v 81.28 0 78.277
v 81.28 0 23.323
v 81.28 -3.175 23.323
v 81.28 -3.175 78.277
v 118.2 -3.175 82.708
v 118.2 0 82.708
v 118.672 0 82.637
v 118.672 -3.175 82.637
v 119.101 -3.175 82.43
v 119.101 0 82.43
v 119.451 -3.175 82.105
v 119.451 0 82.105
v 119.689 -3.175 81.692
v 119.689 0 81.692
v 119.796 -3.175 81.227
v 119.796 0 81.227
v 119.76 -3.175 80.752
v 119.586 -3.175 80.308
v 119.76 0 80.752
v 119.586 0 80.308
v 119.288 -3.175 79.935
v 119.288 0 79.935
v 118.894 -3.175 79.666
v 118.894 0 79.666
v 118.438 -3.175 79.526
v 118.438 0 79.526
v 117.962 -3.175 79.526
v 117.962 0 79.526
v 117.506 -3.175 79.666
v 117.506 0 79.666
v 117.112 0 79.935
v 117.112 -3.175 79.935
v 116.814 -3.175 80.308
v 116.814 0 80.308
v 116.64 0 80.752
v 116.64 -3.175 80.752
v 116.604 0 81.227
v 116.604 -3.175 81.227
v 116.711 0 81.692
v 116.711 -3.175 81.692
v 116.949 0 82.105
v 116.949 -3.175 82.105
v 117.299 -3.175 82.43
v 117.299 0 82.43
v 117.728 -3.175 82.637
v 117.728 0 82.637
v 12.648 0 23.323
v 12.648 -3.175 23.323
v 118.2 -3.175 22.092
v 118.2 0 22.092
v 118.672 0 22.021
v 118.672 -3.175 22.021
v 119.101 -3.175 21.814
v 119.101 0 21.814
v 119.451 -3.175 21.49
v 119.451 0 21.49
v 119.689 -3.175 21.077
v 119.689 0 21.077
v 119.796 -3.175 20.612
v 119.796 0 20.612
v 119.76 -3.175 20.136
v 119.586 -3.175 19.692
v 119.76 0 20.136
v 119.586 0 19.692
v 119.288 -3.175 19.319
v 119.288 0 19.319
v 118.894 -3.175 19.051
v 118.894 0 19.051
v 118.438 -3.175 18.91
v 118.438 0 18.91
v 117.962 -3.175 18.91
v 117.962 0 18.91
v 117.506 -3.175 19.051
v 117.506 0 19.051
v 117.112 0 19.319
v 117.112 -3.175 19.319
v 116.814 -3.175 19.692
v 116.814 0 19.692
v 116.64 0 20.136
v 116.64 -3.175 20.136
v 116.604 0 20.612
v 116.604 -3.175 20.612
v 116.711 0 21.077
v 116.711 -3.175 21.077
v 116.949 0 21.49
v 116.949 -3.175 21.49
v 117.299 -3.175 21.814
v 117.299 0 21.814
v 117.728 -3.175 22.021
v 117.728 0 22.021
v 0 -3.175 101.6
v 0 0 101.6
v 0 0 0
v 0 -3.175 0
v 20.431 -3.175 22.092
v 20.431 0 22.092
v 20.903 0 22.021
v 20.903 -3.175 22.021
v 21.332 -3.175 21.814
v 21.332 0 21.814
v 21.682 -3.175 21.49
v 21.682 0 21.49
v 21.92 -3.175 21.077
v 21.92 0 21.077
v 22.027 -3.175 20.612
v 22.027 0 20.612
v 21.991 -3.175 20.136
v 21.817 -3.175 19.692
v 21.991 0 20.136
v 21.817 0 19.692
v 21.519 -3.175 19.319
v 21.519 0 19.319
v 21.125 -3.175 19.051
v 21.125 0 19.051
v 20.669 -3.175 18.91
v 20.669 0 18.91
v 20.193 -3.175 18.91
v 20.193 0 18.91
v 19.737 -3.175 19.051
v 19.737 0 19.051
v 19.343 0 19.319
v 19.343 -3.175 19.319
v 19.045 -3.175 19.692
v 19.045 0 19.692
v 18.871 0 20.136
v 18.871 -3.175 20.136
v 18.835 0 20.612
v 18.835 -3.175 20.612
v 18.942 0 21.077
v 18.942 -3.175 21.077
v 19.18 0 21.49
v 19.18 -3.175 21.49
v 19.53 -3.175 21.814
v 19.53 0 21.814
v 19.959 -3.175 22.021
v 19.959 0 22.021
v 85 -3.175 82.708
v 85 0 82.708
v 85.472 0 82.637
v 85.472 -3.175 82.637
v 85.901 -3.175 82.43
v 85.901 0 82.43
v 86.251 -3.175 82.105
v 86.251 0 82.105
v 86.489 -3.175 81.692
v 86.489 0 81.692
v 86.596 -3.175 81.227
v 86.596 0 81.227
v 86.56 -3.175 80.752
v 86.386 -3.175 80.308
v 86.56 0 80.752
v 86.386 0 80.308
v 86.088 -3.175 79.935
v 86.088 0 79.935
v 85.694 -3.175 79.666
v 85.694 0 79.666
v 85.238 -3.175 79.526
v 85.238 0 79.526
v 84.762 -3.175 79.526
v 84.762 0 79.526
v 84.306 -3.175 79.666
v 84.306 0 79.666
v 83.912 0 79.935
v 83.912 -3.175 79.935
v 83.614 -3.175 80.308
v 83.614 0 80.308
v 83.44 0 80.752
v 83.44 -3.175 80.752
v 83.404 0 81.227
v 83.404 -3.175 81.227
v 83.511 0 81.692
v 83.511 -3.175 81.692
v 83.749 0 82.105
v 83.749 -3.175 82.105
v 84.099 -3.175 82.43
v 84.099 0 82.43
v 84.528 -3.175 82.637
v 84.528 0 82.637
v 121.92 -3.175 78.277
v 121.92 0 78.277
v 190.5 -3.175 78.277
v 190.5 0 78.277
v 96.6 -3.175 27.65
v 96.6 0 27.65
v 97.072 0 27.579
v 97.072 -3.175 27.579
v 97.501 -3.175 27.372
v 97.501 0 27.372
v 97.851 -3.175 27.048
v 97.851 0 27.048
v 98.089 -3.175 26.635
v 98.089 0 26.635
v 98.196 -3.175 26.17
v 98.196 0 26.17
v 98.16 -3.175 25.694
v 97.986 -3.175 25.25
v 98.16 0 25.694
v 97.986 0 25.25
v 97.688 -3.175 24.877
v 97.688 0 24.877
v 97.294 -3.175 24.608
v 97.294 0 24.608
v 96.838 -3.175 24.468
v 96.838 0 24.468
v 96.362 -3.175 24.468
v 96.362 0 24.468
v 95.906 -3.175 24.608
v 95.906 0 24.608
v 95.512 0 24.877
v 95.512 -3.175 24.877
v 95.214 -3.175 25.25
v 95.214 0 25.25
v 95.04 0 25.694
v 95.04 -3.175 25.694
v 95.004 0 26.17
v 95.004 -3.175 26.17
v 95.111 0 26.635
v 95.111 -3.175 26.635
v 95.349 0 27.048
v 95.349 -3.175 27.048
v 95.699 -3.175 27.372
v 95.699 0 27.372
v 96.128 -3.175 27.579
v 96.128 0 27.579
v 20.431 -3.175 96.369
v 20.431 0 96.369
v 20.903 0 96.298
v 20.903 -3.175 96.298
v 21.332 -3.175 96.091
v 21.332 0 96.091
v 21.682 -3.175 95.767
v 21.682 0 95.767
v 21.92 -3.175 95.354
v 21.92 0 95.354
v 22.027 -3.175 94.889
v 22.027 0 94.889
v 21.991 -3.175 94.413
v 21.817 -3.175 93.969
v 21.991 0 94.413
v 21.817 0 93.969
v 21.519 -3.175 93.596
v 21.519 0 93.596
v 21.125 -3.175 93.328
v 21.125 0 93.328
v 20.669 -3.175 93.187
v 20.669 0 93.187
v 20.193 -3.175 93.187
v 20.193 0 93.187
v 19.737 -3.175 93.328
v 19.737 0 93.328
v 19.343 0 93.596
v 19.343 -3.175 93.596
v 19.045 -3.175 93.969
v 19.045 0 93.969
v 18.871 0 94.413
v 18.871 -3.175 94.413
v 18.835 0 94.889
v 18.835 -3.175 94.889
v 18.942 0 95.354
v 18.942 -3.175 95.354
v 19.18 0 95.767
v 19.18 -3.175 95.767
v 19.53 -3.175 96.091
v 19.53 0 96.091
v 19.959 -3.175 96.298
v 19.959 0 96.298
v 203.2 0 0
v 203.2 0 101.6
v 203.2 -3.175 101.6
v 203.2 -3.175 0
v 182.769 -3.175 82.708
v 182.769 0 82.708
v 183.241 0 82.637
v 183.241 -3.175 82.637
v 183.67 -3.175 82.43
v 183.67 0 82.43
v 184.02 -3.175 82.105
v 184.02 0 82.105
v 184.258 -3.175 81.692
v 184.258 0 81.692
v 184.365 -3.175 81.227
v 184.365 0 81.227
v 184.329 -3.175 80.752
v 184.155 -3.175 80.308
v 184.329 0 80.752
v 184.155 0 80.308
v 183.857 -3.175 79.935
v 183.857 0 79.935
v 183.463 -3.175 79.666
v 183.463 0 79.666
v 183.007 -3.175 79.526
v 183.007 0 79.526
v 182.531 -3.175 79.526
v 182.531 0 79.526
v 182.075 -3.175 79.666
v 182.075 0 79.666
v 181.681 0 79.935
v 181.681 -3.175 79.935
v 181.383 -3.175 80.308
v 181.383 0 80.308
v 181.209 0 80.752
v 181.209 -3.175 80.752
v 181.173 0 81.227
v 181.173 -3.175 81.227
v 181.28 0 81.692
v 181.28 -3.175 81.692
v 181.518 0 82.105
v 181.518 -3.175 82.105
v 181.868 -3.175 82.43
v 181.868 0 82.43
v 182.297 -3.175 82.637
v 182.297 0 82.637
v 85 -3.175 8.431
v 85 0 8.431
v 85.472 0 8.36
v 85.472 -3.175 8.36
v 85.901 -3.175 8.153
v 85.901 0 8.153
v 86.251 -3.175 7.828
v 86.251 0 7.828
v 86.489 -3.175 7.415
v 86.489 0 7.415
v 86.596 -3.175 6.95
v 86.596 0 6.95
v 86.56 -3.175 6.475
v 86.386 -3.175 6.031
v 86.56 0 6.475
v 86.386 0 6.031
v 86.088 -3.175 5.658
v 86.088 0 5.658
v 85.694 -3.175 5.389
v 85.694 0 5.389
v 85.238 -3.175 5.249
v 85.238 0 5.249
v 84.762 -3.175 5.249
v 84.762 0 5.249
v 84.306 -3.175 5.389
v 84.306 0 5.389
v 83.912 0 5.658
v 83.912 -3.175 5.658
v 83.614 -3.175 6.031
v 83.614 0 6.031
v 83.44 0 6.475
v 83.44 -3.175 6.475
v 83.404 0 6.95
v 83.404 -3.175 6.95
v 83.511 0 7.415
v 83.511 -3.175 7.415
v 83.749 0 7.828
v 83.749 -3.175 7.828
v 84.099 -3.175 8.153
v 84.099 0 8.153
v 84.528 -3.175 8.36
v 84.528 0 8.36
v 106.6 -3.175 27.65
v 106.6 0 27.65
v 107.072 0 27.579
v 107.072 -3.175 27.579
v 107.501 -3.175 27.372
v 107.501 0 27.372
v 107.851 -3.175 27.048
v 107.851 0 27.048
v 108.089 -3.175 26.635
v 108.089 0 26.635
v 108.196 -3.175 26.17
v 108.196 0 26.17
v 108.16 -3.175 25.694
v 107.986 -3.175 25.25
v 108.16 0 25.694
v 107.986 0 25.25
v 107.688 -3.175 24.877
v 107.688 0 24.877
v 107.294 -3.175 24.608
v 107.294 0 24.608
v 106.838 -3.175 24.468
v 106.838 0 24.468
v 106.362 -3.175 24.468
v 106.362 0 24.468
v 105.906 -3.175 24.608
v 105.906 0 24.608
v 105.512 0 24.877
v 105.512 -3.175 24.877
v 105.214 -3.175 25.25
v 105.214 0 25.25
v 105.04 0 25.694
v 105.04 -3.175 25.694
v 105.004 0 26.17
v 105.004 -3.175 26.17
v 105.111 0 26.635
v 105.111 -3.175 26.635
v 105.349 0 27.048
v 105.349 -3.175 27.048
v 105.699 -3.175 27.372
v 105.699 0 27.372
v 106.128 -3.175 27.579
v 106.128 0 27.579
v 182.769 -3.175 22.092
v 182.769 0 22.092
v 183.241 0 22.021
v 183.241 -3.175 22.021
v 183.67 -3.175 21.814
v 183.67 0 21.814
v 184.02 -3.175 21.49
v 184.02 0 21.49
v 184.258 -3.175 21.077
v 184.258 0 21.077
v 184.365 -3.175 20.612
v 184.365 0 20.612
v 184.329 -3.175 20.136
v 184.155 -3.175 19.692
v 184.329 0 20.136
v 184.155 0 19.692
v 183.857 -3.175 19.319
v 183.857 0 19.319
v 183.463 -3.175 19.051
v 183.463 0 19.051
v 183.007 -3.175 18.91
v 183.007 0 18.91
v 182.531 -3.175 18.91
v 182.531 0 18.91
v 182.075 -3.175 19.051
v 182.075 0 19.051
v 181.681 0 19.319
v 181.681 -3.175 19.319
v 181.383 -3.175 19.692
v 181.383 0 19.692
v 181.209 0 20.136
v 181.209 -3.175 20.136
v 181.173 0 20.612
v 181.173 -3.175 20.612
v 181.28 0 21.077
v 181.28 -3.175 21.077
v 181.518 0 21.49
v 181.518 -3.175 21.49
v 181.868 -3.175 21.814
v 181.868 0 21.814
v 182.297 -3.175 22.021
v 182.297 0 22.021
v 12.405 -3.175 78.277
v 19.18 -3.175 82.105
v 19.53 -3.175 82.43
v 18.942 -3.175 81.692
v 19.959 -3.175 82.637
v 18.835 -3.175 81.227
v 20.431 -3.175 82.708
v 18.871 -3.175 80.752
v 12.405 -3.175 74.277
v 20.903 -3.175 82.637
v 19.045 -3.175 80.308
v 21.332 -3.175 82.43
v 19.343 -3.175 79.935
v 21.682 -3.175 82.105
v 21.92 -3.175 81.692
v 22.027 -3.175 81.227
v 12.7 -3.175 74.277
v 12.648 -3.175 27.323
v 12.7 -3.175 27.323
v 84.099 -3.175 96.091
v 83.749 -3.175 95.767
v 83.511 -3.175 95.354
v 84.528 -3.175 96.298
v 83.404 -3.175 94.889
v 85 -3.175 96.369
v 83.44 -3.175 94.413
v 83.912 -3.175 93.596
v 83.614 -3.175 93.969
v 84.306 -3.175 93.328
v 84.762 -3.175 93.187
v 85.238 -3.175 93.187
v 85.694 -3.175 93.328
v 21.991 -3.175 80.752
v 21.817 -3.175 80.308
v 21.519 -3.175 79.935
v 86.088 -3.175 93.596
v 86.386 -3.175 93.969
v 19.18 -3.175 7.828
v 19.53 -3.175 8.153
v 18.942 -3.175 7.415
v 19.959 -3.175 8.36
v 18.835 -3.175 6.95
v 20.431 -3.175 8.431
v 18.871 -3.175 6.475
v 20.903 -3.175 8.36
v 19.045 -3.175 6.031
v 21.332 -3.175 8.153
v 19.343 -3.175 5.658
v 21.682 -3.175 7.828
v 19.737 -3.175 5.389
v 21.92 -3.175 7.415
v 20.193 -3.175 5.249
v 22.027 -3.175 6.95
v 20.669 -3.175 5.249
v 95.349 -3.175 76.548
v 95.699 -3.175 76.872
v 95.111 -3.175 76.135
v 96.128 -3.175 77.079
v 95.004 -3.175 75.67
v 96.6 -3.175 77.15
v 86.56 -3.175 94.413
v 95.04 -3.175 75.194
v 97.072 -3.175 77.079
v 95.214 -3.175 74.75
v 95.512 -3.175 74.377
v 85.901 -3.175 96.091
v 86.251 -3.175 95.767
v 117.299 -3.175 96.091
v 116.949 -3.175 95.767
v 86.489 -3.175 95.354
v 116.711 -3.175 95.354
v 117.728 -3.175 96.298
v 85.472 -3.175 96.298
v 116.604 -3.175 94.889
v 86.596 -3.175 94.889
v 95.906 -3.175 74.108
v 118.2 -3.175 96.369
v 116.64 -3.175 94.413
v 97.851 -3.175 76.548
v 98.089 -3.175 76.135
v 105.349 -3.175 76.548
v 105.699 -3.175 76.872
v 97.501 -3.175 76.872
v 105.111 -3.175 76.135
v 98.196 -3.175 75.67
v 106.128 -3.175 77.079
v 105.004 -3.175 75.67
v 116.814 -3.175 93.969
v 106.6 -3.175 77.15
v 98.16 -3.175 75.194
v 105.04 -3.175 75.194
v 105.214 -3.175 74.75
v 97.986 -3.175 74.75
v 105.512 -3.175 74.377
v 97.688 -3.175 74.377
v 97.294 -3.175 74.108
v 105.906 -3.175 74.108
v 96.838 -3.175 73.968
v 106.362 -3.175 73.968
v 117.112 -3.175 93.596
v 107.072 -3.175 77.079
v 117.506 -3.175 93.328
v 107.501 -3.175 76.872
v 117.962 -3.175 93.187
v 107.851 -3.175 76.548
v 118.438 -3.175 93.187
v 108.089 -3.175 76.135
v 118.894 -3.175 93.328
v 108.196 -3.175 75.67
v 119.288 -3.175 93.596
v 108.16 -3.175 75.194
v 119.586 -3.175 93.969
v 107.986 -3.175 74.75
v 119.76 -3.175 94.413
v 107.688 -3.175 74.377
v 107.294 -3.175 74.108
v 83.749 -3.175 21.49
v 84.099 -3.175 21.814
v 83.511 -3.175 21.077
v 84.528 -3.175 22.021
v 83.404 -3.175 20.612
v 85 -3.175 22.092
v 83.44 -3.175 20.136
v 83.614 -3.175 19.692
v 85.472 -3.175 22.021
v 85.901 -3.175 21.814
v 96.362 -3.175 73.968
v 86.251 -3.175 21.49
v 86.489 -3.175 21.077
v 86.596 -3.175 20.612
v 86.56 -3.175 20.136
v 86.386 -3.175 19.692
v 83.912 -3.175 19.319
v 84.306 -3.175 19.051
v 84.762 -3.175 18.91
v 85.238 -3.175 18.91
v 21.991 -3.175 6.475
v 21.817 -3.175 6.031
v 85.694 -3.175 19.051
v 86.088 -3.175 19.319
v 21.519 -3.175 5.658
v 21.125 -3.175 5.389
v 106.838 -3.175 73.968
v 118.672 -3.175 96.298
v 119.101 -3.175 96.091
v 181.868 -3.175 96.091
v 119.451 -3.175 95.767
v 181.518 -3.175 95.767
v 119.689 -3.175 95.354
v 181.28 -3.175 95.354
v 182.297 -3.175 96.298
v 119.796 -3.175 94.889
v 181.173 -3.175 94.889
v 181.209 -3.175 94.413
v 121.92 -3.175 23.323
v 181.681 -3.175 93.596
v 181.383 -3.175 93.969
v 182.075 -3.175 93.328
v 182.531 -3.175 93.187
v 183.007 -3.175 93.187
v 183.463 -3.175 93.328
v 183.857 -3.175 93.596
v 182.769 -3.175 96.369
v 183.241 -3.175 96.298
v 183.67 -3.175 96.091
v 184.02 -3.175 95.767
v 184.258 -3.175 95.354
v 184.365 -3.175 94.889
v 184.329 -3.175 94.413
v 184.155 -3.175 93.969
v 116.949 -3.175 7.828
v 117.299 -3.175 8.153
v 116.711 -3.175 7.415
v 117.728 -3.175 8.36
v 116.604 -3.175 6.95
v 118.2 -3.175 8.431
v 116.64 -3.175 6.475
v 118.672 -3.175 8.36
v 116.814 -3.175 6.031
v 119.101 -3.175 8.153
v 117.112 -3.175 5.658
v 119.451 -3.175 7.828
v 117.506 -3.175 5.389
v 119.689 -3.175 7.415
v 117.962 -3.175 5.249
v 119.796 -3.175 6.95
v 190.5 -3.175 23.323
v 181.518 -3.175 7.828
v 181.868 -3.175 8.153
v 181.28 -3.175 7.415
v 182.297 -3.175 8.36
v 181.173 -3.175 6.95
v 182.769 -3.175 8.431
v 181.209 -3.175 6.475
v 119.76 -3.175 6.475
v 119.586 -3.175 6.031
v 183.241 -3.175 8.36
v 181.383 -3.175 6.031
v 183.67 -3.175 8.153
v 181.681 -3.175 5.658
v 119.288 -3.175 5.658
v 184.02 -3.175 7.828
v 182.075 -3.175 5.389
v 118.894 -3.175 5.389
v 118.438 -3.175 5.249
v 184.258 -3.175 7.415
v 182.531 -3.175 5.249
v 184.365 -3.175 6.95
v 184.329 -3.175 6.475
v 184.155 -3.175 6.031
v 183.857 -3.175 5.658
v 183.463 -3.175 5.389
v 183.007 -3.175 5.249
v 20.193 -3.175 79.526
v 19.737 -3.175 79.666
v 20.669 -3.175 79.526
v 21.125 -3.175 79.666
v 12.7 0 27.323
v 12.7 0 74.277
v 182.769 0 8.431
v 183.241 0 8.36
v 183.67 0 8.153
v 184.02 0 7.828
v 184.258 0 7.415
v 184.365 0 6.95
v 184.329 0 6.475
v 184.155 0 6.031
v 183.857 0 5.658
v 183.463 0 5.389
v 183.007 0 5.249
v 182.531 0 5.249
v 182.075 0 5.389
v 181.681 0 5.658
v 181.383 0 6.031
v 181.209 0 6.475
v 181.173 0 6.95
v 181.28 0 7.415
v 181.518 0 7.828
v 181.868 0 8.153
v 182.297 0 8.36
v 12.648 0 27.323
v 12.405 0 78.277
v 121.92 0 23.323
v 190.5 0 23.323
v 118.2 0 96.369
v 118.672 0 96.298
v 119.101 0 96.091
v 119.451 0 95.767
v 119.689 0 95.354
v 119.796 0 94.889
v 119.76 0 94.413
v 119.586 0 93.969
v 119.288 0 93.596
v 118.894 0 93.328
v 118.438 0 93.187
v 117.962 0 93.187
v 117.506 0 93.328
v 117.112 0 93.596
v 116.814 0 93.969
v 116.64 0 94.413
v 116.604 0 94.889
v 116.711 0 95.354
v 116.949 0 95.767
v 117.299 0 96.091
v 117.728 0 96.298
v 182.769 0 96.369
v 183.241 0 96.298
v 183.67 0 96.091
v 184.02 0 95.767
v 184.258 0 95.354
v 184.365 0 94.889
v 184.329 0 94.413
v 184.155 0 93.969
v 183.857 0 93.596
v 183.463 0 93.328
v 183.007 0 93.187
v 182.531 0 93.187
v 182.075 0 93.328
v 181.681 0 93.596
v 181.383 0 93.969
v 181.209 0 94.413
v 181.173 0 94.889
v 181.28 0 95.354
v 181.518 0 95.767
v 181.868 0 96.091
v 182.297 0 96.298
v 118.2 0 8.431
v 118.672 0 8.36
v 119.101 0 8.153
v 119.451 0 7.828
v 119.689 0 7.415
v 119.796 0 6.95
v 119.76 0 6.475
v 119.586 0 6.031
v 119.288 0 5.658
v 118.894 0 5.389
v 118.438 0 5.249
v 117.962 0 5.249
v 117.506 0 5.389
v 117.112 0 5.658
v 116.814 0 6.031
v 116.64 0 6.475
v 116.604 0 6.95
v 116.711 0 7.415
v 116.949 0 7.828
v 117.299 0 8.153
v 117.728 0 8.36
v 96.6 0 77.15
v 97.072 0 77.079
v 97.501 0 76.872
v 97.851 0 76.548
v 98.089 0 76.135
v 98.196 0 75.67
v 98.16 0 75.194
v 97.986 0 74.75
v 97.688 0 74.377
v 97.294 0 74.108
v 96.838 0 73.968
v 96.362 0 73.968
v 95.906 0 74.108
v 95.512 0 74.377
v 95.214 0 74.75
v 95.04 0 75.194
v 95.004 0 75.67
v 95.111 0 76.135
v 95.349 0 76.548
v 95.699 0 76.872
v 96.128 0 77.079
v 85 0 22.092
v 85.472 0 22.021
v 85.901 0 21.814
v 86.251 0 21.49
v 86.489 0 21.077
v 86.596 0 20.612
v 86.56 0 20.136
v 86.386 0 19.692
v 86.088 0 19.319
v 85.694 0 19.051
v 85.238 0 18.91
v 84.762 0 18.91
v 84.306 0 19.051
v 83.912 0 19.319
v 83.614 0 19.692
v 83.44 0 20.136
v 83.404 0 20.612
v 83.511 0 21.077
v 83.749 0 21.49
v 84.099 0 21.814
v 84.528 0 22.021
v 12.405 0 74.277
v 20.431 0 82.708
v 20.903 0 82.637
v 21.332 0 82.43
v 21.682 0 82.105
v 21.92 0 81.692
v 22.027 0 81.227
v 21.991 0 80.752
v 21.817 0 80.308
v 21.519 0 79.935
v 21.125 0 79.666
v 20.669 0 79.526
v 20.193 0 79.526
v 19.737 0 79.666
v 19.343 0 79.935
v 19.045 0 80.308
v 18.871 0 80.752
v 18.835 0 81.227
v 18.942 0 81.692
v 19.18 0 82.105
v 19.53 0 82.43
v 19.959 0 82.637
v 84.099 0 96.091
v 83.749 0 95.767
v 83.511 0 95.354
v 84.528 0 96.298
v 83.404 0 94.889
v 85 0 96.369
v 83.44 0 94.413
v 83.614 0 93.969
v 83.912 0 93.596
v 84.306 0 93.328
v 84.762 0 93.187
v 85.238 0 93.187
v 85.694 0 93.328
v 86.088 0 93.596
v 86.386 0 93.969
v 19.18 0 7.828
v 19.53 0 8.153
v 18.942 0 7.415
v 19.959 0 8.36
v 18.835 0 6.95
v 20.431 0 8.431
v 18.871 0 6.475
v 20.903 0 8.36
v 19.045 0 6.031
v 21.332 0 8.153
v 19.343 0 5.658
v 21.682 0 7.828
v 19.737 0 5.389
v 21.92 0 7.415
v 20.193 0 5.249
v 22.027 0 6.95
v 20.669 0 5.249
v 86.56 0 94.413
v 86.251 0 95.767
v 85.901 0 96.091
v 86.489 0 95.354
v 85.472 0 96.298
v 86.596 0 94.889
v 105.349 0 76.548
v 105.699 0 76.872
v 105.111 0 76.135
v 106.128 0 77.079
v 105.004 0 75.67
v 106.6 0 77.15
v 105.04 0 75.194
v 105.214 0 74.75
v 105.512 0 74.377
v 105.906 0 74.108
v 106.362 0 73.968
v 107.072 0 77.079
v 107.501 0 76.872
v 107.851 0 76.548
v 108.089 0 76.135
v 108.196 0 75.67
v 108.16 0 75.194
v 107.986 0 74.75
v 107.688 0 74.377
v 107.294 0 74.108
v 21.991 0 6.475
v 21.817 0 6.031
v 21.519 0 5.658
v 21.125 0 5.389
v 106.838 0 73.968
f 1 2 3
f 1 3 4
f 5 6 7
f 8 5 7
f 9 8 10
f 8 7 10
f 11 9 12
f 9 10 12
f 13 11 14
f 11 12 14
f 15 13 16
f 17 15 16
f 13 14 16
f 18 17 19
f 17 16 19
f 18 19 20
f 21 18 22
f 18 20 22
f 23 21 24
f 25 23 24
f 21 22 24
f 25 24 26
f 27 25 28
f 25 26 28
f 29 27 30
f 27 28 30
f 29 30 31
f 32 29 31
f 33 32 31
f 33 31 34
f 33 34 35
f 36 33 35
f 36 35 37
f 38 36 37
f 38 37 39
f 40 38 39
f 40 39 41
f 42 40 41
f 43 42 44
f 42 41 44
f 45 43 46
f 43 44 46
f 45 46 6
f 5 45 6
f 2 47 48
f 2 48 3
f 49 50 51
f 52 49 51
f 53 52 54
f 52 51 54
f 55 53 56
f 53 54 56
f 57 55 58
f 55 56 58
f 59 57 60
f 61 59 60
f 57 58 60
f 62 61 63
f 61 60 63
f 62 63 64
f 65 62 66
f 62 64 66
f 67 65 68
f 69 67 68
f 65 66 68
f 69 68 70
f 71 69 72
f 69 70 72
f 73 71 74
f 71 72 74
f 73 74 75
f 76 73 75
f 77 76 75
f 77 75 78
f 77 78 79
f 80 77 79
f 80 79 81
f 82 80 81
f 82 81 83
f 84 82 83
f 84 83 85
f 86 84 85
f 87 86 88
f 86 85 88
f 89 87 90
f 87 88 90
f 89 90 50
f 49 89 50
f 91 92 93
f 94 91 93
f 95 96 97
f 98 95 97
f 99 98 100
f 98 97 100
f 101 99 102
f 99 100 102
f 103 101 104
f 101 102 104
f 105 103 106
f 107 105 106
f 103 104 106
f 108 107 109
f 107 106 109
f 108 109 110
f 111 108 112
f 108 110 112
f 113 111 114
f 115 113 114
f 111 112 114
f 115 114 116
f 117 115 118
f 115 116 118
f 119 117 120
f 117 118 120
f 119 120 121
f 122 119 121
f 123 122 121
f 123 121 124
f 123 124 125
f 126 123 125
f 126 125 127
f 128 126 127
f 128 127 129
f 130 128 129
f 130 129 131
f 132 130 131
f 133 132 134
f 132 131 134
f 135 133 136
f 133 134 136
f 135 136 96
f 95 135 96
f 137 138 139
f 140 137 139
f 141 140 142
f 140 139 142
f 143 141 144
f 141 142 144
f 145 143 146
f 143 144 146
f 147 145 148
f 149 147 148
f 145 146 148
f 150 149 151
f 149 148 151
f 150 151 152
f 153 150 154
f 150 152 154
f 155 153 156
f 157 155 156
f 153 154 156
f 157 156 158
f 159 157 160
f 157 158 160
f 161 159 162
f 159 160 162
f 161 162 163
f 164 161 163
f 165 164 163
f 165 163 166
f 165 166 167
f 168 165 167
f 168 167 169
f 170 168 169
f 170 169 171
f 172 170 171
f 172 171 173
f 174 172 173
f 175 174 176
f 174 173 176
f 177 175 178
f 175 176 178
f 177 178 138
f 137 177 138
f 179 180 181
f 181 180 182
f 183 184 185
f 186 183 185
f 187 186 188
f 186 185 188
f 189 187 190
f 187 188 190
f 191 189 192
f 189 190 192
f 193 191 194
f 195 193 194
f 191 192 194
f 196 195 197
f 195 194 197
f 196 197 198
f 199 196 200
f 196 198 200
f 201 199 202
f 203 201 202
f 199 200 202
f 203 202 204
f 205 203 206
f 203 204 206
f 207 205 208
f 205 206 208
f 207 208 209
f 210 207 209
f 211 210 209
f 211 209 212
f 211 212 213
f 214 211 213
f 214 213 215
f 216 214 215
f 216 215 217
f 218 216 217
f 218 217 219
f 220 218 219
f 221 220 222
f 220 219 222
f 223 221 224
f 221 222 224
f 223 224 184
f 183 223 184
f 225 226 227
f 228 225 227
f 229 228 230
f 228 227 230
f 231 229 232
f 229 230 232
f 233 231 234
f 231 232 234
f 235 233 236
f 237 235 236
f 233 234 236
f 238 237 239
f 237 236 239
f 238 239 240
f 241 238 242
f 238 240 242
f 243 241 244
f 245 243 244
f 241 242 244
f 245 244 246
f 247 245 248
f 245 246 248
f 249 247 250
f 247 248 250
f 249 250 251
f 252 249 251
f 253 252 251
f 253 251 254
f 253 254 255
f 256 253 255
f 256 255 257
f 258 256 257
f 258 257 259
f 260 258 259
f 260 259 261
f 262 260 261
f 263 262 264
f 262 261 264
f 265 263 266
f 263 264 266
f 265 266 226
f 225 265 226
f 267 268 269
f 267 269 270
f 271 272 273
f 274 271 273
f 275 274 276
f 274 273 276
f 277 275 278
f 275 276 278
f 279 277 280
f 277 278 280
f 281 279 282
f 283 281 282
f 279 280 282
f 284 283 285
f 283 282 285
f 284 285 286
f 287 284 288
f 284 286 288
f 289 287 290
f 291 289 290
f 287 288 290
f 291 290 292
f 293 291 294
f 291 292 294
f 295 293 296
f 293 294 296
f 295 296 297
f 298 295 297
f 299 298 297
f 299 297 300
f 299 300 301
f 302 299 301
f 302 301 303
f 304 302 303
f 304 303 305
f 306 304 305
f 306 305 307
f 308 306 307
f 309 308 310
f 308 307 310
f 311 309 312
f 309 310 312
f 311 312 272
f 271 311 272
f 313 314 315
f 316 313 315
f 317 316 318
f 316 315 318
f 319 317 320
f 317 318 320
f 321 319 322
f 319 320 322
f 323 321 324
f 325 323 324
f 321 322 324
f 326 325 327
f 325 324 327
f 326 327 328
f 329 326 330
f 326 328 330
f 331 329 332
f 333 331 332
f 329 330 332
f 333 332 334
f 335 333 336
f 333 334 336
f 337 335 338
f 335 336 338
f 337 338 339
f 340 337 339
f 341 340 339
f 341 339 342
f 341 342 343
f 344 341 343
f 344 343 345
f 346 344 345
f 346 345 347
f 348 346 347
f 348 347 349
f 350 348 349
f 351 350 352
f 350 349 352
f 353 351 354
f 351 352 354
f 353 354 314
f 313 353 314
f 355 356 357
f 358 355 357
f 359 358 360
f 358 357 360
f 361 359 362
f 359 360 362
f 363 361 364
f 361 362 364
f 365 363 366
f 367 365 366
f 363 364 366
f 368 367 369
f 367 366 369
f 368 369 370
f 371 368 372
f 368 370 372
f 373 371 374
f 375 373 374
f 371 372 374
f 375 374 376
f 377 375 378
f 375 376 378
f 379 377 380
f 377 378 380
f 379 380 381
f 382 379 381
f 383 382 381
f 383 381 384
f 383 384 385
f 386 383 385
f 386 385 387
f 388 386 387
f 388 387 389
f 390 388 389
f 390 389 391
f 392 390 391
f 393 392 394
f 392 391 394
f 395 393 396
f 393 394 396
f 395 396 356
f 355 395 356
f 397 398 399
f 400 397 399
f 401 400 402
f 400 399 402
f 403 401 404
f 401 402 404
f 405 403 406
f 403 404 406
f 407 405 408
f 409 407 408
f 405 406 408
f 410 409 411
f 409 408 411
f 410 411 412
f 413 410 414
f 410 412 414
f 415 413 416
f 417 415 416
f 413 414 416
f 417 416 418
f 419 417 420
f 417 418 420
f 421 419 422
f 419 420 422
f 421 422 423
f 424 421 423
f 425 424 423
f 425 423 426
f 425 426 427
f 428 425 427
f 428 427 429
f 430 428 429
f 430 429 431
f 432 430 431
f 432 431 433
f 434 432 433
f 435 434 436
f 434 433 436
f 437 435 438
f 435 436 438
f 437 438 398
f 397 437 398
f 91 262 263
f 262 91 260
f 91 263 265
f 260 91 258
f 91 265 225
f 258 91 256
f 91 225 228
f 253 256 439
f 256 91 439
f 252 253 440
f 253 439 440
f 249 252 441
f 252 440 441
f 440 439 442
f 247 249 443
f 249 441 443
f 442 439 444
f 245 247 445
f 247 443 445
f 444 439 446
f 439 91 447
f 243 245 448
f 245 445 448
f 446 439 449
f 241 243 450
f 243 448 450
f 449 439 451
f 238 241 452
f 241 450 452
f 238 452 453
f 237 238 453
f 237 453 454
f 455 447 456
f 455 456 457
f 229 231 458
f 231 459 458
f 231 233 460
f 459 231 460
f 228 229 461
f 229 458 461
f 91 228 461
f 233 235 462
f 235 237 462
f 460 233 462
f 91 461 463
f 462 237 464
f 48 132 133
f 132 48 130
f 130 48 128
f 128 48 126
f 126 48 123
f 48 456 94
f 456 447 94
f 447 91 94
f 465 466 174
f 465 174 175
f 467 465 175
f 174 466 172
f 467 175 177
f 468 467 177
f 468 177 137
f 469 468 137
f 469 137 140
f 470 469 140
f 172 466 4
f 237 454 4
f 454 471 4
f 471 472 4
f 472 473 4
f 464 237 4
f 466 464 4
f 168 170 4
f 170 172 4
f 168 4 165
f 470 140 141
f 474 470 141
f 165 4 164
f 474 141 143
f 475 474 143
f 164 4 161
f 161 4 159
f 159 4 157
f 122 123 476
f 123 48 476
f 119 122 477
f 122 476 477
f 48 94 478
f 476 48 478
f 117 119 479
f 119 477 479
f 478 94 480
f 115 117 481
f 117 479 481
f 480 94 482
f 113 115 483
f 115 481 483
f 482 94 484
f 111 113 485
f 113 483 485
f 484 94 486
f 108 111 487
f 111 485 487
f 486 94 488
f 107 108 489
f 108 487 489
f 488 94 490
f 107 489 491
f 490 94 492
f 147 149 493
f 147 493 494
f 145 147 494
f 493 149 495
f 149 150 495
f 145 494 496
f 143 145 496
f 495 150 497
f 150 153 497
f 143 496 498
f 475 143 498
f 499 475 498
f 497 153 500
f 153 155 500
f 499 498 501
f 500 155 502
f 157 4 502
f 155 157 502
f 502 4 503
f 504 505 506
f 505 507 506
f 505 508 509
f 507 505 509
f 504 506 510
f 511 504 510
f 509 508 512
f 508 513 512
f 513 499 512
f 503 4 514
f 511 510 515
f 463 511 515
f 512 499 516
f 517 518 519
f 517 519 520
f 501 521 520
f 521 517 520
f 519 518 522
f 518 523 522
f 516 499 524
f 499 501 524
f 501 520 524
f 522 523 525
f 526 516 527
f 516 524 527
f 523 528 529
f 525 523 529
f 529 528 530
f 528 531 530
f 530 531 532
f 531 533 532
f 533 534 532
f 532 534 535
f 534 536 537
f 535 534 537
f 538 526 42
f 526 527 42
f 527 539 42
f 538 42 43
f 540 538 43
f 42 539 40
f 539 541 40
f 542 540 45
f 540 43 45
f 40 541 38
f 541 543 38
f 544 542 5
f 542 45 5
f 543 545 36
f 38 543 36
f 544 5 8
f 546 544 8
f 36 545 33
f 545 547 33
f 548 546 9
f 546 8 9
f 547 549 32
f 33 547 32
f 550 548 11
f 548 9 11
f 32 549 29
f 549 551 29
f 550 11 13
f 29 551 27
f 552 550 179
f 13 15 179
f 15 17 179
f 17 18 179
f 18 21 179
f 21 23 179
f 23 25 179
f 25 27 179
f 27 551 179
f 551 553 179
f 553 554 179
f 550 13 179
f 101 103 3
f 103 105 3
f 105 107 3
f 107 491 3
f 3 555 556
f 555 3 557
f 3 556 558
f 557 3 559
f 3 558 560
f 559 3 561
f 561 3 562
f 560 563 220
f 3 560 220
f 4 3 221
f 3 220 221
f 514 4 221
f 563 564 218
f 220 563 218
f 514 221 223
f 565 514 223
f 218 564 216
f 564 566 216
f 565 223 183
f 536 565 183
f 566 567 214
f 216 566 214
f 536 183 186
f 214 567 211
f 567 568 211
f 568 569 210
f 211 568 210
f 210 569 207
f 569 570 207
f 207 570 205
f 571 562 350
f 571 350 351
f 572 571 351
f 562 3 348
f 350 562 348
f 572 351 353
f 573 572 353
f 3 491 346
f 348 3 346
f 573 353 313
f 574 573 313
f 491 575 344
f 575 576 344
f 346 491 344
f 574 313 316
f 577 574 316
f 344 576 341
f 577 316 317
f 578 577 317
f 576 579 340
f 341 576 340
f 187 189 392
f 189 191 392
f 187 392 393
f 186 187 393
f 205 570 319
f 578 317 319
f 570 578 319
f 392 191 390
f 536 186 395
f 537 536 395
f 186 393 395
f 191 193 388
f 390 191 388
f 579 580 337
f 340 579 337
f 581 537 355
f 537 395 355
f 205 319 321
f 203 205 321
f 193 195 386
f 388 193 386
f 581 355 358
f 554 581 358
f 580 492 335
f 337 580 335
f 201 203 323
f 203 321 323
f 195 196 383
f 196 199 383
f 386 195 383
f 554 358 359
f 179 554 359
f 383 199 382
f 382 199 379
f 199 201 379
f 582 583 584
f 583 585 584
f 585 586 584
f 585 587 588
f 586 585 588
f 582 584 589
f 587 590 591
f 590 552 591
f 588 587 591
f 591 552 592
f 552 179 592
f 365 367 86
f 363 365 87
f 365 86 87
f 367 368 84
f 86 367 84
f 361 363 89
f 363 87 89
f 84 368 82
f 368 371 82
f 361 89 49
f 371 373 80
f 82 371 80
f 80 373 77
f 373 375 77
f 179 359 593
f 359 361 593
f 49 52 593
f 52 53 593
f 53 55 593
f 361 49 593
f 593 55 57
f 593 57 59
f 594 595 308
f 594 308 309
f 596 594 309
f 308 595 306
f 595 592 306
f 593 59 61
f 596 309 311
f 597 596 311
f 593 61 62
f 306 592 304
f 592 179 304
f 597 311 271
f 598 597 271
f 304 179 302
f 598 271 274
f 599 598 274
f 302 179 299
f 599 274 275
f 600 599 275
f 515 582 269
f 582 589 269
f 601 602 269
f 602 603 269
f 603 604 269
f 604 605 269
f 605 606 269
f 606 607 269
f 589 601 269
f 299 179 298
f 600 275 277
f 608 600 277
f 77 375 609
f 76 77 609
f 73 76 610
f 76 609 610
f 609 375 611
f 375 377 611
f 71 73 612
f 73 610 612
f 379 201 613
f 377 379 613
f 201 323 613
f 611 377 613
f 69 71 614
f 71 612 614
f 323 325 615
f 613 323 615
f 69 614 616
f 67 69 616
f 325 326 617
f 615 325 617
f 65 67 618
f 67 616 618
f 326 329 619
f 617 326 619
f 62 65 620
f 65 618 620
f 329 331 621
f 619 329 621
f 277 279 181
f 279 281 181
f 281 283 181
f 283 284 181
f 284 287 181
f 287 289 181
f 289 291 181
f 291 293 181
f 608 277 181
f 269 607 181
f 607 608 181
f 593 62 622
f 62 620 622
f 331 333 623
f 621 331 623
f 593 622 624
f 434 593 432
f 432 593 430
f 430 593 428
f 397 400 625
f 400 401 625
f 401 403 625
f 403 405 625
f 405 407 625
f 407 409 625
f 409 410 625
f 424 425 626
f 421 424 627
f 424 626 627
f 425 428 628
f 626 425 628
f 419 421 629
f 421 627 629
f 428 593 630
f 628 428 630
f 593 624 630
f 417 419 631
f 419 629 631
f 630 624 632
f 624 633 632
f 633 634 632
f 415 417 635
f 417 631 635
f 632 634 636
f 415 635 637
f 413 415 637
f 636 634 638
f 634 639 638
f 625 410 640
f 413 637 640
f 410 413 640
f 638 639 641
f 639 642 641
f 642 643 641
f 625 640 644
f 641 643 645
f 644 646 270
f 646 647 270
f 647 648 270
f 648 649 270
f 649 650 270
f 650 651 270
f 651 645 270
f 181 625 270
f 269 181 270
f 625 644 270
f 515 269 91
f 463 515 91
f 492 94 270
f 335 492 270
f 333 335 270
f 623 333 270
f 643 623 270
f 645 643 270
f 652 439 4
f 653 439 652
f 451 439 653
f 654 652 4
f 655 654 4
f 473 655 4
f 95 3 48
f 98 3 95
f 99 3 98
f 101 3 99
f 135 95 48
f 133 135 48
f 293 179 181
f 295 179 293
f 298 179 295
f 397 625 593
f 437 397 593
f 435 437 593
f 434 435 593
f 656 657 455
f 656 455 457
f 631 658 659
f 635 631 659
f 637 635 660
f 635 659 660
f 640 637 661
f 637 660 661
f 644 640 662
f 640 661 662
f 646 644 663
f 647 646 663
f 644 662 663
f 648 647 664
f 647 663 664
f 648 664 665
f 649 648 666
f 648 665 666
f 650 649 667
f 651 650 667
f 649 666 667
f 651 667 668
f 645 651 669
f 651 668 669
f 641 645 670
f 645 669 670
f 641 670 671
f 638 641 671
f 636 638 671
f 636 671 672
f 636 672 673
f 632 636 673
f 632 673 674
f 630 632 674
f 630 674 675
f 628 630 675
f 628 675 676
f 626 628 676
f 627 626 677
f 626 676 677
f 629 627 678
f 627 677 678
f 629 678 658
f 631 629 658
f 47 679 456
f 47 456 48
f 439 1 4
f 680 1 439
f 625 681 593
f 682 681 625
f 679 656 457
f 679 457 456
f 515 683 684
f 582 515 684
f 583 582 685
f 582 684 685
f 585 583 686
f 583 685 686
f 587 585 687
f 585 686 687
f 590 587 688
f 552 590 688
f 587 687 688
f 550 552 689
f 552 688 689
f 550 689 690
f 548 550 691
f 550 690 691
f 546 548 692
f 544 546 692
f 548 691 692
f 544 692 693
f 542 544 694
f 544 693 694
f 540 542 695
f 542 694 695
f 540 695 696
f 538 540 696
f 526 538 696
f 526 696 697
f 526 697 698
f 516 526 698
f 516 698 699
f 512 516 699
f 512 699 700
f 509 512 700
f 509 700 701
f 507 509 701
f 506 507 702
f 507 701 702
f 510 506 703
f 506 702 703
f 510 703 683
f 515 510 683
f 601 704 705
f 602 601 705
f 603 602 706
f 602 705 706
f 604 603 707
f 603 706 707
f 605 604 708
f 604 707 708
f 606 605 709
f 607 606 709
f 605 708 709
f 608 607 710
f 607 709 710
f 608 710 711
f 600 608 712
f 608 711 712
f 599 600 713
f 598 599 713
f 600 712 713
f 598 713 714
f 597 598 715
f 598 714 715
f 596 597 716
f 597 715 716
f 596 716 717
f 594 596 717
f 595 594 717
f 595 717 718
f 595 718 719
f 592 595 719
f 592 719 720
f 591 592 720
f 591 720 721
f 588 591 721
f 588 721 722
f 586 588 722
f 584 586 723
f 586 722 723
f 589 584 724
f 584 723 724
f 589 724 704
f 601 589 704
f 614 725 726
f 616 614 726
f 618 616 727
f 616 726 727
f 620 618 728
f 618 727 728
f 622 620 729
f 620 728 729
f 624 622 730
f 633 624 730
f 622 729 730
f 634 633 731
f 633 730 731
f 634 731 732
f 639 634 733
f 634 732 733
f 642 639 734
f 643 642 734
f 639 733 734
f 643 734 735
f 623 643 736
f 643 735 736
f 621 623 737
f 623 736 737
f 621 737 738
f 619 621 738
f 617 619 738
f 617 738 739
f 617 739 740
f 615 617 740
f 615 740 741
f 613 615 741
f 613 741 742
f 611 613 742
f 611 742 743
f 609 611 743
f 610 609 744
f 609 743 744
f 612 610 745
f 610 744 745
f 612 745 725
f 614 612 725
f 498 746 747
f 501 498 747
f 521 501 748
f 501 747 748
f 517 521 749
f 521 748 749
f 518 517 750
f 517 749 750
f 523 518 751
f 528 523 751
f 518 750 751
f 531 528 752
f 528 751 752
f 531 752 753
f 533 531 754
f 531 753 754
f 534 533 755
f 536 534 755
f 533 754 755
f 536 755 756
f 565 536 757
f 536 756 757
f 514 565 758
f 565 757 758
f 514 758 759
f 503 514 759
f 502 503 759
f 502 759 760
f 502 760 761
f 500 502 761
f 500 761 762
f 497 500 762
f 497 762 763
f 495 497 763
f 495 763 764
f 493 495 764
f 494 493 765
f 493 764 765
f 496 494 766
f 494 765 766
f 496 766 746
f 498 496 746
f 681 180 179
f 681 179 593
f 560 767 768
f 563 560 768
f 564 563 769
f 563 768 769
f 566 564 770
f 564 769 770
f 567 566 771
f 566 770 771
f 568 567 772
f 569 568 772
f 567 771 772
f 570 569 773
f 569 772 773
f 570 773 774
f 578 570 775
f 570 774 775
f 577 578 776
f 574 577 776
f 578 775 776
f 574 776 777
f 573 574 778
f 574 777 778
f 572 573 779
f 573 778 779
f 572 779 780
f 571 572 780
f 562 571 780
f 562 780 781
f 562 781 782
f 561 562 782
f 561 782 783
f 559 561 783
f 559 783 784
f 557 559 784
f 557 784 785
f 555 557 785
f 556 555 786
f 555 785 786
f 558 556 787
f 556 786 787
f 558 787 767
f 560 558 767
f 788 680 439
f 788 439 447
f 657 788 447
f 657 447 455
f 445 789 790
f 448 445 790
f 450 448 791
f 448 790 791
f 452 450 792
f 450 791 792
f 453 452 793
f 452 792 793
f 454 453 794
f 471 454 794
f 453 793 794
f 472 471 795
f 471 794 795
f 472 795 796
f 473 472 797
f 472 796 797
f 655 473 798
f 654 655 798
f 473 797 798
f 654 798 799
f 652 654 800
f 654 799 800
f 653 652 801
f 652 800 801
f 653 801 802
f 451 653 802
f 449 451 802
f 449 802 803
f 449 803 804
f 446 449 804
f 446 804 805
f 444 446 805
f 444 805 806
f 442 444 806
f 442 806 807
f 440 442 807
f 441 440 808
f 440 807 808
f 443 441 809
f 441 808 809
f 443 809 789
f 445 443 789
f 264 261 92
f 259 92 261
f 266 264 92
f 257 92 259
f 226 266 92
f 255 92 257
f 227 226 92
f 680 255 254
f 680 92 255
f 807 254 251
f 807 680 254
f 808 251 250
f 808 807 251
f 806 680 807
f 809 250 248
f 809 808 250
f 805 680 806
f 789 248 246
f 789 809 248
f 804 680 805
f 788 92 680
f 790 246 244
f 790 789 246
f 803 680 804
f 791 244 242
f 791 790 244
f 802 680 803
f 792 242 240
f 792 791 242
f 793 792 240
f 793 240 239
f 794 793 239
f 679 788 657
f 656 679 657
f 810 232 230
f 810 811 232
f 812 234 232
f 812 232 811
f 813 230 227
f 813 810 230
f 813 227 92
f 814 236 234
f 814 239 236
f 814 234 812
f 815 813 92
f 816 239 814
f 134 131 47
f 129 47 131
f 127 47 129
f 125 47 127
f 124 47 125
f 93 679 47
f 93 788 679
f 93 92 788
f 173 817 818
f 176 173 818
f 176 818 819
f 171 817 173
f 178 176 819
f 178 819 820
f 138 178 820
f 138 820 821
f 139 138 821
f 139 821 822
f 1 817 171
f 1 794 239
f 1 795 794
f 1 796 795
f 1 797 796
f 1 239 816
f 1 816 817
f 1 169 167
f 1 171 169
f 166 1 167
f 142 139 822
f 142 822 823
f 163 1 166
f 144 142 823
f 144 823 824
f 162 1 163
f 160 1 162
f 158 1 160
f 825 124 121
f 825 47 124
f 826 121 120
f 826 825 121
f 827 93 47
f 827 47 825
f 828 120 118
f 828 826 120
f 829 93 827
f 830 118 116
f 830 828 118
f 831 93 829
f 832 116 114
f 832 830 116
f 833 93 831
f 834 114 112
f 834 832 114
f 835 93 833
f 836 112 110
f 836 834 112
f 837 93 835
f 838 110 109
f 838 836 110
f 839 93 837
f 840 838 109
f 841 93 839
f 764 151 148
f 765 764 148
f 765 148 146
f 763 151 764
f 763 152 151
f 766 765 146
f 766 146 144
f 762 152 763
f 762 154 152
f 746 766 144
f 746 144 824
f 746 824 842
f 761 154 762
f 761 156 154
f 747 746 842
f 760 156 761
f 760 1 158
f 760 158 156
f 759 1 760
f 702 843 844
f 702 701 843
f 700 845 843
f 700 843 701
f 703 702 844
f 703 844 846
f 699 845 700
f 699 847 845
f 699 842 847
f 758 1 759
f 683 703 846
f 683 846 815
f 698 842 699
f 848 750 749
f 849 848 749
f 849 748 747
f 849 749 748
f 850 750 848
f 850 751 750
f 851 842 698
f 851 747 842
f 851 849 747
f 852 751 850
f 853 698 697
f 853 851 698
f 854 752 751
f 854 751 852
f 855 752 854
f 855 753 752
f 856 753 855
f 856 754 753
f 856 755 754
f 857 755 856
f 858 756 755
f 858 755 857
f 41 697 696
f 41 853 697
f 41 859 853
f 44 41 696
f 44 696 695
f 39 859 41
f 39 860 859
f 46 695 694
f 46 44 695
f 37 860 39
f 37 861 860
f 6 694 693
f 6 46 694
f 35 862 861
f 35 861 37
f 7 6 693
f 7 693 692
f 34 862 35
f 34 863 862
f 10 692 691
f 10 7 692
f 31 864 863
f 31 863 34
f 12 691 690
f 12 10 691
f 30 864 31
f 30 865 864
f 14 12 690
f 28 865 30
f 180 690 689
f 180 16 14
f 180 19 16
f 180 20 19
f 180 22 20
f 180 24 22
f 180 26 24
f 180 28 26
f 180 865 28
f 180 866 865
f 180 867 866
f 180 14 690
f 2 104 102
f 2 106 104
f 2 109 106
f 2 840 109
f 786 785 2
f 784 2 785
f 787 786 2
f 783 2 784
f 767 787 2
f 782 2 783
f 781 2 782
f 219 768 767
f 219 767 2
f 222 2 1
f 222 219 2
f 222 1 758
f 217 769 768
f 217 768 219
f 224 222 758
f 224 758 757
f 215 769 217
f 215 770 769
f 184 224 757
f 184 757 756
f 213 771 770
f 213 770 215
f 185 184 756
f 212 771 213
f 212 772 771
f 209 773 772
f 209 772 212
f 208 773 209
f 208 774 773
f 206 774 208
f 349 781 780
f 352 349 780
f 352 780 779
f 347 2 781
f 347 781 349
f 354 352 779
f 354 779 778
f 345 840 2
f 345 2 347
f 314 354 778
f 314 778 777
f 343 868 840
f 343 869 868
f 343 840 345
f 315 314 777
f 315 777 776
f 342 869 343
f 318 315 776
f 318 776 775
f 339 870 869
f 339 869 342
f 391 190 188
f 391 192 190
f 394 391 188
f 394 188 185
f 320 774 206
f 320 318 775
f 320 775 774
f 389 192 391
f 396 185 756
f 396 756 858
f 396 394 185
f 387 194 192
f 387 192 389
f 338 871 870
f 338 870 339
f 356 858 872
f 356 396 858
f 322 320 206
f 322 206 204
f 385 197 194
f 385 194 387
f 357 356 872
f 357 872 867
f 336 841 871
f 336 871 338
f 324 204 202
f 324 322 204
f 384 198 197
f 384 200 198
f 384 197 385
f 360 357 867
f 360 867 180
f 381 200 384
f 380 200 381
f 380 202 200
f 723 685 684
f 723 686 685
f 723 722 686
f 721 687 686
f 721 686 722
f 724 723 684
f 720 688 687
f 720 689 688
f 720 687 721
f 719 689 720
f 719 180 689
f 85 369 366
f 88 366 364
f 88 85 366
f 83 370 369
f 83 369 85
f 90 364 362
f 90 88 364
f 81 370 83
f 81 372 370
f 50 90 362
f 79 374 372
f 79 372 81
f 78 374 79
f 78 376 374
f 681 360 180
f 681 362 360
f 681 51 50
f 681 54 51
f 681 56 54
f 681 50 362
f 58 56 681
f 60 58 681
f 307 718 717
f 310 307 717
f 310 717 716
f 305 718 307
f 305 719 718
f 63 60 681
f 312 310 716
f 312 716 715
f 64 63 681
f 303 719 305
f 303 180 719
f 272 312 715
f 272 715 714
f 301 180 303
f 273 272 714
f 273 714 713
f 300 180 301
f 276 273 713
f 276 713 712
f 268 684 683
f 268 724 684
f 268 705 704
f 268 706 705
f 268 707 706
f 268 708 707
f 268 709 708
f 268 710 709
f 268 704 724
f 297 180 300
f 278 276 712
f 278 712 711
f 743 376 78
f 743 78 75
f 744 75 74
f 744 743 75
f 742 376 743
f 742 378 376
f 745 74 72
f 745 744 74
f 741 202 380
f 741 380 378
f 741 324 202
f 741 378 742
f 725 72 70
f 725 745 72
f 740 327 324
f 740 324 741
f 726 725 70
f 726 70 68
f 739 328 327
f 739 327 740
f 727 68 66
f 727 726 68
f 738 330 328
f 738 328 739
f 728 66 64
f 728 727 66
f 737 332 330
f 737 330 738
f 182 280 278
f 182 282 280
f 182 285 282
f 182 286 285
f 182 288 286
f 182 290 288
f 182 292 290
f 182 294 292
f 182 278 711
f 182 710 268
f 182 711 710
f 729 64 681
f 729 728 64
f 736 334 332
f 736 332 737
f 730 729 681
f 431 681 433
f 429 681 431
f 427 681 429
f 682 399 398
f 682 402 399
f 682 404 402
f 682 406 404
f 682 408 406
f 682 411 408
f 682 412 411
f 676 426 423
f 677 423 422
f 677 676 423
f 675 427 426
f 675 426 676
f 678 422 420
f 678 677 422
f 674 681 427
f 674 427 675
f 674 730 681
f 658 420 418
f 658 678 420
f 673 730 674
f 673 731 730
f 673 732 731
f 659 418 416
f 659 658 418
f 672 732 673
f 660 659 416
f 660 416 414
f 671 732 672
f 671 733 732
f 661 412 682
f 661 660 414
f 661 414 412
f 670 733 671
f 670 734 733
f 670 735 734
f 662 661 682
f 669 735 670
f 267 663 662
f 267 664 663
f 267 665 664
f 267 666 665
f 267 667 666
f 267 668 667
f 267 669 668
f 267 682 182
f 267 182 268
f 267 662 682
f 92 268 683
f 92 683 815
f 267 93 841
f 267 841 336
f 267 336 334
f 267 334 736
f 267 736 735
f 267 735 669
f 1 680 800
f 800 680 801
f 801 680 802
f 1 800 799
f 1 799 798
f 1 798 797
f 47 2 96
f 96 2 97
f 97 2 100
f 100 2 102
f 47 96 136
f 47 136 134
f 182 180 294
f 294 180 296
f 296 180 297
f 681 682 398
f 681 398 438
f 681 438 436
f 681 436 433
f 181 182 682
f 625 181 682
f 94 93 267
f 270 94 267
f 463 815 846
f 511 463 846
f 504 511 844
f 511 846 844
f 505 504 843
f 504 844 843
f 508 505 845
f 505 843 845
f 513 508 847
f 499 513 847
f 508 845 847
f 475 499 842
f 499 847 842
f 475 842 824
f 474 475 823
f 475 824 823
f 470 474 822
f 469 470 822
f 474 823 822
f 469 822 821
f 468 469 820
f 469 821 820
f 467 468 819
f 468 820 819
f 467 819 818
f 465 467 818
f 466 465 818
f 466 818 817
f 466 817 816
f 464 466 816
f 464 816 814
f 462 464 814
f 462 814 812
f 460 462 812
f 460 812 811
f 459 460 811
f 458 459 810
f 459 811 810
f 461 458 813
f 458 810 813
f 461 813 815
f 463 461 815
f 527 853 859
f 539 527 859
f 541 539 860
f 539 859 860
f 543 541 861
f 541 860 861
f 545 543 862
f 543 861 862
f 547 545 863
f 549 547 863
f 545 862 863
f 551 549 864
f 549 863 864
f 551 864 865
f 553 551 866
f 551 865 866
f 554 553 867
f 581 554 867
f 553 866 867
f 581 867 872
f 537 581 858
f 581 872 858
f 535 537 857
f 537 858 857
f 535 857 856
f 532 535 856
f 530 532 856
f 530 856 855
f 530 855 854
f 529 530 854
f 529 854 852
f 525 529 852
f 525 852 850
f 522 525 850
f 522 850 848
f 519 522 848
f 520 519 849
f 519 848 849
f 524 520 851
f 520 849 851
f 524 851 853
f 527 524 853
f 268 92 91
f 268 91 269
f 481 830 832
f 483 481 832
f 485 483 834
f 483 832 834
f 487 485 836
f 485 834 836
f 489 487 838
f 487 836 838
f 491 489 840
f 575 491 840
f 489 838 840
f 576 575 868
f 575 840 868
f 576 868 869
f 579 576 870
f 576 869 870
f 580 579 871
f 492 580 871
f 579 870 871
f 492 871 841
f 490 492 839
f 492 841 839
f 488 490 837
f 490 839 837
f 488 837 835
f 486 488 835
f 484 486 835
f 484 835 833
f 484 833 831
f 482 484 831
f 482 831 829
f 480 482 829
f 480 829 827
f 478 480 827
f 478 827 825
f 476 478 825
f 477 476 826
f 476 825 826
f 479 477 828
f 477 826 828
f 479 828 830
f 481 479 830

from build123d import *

# Parameters (mm, degrees)
SKETCH1_W           = 203.2
SKETCH1_H           = 101.6
SKETCH1_R           = 1.6
SKETCH1_W_2         = 68.58
SKETCH1_H_2         = 54.953705786
BOSS_EXTRUDE1_DEPTH = 3.175


with BuildPart() as part:
    # Sketch1 → Boss-Extrude1 (new body)
    with BuildSketch(Plane(origin=(0, 0, 0), x_dir=(1, 0, 0), z_dir=(0, 1, 0))):
        with Locations((101.6, -50.8)):
            Rectangle(SKETCH1_W, SKETCH1_H)
        with Locations(Location((20.431013284, -94.769213223, 0), (0, 0, 270))):
            Circle(SKETCH1_R, mode=Mode.SUBTRACT)
        with Locations(Location((20.431013284, -81.10763967, 0), (0, 0, 270))):
            Circle(SKETCH1_R, mode=Mode.SUBTRACT)
        with Locations(Location((85, -94.769213223, 0), (0, 0, 270))):
            Circle(SKETCH1_R, mode=Mode.SUBTRACT)
        with Locations(Location((85, -81.10763967, 0), (0, 0, 270))):
            Circle(SKETCH1_R, mode=Mode.SUBTRACT)
        with Locations(Location((96.6, -75.55, 0), (0, 0, 270))):
            Circle(SKETCH1_R, mode=Mode.SUBTRACT)
        Polygon((12.405089541, -78.276852893), (12.405089541, -74.276852893), (12.7, -74.276852893), (12.7, -27.323147107), (12.648382796, -27.323147107), (12.648382796, -23.323147107), (81.28, -23.323147107), (81.28, -78.276852893), align=None, mode=Mode.SUBTRACT)
        with Locations(Location((118.2, -94.769213223, 0), (0, 0, 270))):
            Circle(SKETCH1_R, mode=Mode.SUBTRACT)
        with Locations(Location((118.2, -81.10763967, 0), (0, 0, 270))):
            Circle(SKETCH1_R, mode=Mode.SUBTRACT)
        with Locations(Location((106.6, -75.55, 0), (0, 0, 270))):
            Circle(SKETCH1_R, mode=Mode.SUBTRACT)
        with Locations(Location((182.768986716, -94.769213223, 0), (0, 0, 270))):
            Circle(SKETCH1_R, mode=Mode.SUBTRACT)
        with Locations(Location((182.768986716, -81.10763967, 0), (0, 0, 270))):
            Circle(SKETCH1_R, mode=Mode.SUBTRACT)
        with Locations((156.21, -50.8)):
            Rectangle(SKETCH1_W_2, SKETCH1_H_2, mode=Mode.SUBTRACT)
        with Locations(Location((20.431013284, -20.49236033, 0), (0, 0, 270))):
            Circle(SKETCH1_R, mode=Mode.SUBTRACT)
        with Locations(Location((20.431013284, -6.830786777, 0), (0, 0, 270))):
            Circle(SKETCH1_R, mode=Mode.SUBTRACT)
        with Locations(Location((96.6, -26.05, 0), (0, 0, 270))):
            Circle(SKETCH1_R, mode=Mode.SUBTRACT)
        with Locations(Location((85, -20.49236033, 0), (0, 0, 270))):
            Circle(SKETCH1_R, mode=Mode.SUBTRACT)
        with Locations(Location((85, -6.830786777, 0), (0, 0, 270))):
            Circle(SKETCH1_R, mode=Mode.SUBTRACT)
        with Locations(Location((106.6, -26.05, 0), (0, 0, 270))):
            Circle(SKETCH1_R, mode=Mode.SUBTRACT)
        with Locations(Location((118.2, -20.49236033, 0), (0, 0, 270))):
            Circle(SKETCH1_R, mode=Mode.SUBTRACT)
        with Locations(Location((118.2, -6.830786777, 0), (0, 0, 270))):
            Circle(SKETCH1_R, mode=Mode.SUBTRACT)
        with Locations(Location((182.768986716, -20.49236033, 0), (0, 0, 270))):
            Circle(SKETCH1_R, mode=Mode.SUBTRACT)
        with Locations(Location((182.768986716, -6.830786777, 0), (0, 0, 270))):
            Circle(SKETCH1_R, mode=Mode.SUBTRACT)
    extrude(amount=-BOSS_EXTRUDE1_DEPTH)


solid = part.part
